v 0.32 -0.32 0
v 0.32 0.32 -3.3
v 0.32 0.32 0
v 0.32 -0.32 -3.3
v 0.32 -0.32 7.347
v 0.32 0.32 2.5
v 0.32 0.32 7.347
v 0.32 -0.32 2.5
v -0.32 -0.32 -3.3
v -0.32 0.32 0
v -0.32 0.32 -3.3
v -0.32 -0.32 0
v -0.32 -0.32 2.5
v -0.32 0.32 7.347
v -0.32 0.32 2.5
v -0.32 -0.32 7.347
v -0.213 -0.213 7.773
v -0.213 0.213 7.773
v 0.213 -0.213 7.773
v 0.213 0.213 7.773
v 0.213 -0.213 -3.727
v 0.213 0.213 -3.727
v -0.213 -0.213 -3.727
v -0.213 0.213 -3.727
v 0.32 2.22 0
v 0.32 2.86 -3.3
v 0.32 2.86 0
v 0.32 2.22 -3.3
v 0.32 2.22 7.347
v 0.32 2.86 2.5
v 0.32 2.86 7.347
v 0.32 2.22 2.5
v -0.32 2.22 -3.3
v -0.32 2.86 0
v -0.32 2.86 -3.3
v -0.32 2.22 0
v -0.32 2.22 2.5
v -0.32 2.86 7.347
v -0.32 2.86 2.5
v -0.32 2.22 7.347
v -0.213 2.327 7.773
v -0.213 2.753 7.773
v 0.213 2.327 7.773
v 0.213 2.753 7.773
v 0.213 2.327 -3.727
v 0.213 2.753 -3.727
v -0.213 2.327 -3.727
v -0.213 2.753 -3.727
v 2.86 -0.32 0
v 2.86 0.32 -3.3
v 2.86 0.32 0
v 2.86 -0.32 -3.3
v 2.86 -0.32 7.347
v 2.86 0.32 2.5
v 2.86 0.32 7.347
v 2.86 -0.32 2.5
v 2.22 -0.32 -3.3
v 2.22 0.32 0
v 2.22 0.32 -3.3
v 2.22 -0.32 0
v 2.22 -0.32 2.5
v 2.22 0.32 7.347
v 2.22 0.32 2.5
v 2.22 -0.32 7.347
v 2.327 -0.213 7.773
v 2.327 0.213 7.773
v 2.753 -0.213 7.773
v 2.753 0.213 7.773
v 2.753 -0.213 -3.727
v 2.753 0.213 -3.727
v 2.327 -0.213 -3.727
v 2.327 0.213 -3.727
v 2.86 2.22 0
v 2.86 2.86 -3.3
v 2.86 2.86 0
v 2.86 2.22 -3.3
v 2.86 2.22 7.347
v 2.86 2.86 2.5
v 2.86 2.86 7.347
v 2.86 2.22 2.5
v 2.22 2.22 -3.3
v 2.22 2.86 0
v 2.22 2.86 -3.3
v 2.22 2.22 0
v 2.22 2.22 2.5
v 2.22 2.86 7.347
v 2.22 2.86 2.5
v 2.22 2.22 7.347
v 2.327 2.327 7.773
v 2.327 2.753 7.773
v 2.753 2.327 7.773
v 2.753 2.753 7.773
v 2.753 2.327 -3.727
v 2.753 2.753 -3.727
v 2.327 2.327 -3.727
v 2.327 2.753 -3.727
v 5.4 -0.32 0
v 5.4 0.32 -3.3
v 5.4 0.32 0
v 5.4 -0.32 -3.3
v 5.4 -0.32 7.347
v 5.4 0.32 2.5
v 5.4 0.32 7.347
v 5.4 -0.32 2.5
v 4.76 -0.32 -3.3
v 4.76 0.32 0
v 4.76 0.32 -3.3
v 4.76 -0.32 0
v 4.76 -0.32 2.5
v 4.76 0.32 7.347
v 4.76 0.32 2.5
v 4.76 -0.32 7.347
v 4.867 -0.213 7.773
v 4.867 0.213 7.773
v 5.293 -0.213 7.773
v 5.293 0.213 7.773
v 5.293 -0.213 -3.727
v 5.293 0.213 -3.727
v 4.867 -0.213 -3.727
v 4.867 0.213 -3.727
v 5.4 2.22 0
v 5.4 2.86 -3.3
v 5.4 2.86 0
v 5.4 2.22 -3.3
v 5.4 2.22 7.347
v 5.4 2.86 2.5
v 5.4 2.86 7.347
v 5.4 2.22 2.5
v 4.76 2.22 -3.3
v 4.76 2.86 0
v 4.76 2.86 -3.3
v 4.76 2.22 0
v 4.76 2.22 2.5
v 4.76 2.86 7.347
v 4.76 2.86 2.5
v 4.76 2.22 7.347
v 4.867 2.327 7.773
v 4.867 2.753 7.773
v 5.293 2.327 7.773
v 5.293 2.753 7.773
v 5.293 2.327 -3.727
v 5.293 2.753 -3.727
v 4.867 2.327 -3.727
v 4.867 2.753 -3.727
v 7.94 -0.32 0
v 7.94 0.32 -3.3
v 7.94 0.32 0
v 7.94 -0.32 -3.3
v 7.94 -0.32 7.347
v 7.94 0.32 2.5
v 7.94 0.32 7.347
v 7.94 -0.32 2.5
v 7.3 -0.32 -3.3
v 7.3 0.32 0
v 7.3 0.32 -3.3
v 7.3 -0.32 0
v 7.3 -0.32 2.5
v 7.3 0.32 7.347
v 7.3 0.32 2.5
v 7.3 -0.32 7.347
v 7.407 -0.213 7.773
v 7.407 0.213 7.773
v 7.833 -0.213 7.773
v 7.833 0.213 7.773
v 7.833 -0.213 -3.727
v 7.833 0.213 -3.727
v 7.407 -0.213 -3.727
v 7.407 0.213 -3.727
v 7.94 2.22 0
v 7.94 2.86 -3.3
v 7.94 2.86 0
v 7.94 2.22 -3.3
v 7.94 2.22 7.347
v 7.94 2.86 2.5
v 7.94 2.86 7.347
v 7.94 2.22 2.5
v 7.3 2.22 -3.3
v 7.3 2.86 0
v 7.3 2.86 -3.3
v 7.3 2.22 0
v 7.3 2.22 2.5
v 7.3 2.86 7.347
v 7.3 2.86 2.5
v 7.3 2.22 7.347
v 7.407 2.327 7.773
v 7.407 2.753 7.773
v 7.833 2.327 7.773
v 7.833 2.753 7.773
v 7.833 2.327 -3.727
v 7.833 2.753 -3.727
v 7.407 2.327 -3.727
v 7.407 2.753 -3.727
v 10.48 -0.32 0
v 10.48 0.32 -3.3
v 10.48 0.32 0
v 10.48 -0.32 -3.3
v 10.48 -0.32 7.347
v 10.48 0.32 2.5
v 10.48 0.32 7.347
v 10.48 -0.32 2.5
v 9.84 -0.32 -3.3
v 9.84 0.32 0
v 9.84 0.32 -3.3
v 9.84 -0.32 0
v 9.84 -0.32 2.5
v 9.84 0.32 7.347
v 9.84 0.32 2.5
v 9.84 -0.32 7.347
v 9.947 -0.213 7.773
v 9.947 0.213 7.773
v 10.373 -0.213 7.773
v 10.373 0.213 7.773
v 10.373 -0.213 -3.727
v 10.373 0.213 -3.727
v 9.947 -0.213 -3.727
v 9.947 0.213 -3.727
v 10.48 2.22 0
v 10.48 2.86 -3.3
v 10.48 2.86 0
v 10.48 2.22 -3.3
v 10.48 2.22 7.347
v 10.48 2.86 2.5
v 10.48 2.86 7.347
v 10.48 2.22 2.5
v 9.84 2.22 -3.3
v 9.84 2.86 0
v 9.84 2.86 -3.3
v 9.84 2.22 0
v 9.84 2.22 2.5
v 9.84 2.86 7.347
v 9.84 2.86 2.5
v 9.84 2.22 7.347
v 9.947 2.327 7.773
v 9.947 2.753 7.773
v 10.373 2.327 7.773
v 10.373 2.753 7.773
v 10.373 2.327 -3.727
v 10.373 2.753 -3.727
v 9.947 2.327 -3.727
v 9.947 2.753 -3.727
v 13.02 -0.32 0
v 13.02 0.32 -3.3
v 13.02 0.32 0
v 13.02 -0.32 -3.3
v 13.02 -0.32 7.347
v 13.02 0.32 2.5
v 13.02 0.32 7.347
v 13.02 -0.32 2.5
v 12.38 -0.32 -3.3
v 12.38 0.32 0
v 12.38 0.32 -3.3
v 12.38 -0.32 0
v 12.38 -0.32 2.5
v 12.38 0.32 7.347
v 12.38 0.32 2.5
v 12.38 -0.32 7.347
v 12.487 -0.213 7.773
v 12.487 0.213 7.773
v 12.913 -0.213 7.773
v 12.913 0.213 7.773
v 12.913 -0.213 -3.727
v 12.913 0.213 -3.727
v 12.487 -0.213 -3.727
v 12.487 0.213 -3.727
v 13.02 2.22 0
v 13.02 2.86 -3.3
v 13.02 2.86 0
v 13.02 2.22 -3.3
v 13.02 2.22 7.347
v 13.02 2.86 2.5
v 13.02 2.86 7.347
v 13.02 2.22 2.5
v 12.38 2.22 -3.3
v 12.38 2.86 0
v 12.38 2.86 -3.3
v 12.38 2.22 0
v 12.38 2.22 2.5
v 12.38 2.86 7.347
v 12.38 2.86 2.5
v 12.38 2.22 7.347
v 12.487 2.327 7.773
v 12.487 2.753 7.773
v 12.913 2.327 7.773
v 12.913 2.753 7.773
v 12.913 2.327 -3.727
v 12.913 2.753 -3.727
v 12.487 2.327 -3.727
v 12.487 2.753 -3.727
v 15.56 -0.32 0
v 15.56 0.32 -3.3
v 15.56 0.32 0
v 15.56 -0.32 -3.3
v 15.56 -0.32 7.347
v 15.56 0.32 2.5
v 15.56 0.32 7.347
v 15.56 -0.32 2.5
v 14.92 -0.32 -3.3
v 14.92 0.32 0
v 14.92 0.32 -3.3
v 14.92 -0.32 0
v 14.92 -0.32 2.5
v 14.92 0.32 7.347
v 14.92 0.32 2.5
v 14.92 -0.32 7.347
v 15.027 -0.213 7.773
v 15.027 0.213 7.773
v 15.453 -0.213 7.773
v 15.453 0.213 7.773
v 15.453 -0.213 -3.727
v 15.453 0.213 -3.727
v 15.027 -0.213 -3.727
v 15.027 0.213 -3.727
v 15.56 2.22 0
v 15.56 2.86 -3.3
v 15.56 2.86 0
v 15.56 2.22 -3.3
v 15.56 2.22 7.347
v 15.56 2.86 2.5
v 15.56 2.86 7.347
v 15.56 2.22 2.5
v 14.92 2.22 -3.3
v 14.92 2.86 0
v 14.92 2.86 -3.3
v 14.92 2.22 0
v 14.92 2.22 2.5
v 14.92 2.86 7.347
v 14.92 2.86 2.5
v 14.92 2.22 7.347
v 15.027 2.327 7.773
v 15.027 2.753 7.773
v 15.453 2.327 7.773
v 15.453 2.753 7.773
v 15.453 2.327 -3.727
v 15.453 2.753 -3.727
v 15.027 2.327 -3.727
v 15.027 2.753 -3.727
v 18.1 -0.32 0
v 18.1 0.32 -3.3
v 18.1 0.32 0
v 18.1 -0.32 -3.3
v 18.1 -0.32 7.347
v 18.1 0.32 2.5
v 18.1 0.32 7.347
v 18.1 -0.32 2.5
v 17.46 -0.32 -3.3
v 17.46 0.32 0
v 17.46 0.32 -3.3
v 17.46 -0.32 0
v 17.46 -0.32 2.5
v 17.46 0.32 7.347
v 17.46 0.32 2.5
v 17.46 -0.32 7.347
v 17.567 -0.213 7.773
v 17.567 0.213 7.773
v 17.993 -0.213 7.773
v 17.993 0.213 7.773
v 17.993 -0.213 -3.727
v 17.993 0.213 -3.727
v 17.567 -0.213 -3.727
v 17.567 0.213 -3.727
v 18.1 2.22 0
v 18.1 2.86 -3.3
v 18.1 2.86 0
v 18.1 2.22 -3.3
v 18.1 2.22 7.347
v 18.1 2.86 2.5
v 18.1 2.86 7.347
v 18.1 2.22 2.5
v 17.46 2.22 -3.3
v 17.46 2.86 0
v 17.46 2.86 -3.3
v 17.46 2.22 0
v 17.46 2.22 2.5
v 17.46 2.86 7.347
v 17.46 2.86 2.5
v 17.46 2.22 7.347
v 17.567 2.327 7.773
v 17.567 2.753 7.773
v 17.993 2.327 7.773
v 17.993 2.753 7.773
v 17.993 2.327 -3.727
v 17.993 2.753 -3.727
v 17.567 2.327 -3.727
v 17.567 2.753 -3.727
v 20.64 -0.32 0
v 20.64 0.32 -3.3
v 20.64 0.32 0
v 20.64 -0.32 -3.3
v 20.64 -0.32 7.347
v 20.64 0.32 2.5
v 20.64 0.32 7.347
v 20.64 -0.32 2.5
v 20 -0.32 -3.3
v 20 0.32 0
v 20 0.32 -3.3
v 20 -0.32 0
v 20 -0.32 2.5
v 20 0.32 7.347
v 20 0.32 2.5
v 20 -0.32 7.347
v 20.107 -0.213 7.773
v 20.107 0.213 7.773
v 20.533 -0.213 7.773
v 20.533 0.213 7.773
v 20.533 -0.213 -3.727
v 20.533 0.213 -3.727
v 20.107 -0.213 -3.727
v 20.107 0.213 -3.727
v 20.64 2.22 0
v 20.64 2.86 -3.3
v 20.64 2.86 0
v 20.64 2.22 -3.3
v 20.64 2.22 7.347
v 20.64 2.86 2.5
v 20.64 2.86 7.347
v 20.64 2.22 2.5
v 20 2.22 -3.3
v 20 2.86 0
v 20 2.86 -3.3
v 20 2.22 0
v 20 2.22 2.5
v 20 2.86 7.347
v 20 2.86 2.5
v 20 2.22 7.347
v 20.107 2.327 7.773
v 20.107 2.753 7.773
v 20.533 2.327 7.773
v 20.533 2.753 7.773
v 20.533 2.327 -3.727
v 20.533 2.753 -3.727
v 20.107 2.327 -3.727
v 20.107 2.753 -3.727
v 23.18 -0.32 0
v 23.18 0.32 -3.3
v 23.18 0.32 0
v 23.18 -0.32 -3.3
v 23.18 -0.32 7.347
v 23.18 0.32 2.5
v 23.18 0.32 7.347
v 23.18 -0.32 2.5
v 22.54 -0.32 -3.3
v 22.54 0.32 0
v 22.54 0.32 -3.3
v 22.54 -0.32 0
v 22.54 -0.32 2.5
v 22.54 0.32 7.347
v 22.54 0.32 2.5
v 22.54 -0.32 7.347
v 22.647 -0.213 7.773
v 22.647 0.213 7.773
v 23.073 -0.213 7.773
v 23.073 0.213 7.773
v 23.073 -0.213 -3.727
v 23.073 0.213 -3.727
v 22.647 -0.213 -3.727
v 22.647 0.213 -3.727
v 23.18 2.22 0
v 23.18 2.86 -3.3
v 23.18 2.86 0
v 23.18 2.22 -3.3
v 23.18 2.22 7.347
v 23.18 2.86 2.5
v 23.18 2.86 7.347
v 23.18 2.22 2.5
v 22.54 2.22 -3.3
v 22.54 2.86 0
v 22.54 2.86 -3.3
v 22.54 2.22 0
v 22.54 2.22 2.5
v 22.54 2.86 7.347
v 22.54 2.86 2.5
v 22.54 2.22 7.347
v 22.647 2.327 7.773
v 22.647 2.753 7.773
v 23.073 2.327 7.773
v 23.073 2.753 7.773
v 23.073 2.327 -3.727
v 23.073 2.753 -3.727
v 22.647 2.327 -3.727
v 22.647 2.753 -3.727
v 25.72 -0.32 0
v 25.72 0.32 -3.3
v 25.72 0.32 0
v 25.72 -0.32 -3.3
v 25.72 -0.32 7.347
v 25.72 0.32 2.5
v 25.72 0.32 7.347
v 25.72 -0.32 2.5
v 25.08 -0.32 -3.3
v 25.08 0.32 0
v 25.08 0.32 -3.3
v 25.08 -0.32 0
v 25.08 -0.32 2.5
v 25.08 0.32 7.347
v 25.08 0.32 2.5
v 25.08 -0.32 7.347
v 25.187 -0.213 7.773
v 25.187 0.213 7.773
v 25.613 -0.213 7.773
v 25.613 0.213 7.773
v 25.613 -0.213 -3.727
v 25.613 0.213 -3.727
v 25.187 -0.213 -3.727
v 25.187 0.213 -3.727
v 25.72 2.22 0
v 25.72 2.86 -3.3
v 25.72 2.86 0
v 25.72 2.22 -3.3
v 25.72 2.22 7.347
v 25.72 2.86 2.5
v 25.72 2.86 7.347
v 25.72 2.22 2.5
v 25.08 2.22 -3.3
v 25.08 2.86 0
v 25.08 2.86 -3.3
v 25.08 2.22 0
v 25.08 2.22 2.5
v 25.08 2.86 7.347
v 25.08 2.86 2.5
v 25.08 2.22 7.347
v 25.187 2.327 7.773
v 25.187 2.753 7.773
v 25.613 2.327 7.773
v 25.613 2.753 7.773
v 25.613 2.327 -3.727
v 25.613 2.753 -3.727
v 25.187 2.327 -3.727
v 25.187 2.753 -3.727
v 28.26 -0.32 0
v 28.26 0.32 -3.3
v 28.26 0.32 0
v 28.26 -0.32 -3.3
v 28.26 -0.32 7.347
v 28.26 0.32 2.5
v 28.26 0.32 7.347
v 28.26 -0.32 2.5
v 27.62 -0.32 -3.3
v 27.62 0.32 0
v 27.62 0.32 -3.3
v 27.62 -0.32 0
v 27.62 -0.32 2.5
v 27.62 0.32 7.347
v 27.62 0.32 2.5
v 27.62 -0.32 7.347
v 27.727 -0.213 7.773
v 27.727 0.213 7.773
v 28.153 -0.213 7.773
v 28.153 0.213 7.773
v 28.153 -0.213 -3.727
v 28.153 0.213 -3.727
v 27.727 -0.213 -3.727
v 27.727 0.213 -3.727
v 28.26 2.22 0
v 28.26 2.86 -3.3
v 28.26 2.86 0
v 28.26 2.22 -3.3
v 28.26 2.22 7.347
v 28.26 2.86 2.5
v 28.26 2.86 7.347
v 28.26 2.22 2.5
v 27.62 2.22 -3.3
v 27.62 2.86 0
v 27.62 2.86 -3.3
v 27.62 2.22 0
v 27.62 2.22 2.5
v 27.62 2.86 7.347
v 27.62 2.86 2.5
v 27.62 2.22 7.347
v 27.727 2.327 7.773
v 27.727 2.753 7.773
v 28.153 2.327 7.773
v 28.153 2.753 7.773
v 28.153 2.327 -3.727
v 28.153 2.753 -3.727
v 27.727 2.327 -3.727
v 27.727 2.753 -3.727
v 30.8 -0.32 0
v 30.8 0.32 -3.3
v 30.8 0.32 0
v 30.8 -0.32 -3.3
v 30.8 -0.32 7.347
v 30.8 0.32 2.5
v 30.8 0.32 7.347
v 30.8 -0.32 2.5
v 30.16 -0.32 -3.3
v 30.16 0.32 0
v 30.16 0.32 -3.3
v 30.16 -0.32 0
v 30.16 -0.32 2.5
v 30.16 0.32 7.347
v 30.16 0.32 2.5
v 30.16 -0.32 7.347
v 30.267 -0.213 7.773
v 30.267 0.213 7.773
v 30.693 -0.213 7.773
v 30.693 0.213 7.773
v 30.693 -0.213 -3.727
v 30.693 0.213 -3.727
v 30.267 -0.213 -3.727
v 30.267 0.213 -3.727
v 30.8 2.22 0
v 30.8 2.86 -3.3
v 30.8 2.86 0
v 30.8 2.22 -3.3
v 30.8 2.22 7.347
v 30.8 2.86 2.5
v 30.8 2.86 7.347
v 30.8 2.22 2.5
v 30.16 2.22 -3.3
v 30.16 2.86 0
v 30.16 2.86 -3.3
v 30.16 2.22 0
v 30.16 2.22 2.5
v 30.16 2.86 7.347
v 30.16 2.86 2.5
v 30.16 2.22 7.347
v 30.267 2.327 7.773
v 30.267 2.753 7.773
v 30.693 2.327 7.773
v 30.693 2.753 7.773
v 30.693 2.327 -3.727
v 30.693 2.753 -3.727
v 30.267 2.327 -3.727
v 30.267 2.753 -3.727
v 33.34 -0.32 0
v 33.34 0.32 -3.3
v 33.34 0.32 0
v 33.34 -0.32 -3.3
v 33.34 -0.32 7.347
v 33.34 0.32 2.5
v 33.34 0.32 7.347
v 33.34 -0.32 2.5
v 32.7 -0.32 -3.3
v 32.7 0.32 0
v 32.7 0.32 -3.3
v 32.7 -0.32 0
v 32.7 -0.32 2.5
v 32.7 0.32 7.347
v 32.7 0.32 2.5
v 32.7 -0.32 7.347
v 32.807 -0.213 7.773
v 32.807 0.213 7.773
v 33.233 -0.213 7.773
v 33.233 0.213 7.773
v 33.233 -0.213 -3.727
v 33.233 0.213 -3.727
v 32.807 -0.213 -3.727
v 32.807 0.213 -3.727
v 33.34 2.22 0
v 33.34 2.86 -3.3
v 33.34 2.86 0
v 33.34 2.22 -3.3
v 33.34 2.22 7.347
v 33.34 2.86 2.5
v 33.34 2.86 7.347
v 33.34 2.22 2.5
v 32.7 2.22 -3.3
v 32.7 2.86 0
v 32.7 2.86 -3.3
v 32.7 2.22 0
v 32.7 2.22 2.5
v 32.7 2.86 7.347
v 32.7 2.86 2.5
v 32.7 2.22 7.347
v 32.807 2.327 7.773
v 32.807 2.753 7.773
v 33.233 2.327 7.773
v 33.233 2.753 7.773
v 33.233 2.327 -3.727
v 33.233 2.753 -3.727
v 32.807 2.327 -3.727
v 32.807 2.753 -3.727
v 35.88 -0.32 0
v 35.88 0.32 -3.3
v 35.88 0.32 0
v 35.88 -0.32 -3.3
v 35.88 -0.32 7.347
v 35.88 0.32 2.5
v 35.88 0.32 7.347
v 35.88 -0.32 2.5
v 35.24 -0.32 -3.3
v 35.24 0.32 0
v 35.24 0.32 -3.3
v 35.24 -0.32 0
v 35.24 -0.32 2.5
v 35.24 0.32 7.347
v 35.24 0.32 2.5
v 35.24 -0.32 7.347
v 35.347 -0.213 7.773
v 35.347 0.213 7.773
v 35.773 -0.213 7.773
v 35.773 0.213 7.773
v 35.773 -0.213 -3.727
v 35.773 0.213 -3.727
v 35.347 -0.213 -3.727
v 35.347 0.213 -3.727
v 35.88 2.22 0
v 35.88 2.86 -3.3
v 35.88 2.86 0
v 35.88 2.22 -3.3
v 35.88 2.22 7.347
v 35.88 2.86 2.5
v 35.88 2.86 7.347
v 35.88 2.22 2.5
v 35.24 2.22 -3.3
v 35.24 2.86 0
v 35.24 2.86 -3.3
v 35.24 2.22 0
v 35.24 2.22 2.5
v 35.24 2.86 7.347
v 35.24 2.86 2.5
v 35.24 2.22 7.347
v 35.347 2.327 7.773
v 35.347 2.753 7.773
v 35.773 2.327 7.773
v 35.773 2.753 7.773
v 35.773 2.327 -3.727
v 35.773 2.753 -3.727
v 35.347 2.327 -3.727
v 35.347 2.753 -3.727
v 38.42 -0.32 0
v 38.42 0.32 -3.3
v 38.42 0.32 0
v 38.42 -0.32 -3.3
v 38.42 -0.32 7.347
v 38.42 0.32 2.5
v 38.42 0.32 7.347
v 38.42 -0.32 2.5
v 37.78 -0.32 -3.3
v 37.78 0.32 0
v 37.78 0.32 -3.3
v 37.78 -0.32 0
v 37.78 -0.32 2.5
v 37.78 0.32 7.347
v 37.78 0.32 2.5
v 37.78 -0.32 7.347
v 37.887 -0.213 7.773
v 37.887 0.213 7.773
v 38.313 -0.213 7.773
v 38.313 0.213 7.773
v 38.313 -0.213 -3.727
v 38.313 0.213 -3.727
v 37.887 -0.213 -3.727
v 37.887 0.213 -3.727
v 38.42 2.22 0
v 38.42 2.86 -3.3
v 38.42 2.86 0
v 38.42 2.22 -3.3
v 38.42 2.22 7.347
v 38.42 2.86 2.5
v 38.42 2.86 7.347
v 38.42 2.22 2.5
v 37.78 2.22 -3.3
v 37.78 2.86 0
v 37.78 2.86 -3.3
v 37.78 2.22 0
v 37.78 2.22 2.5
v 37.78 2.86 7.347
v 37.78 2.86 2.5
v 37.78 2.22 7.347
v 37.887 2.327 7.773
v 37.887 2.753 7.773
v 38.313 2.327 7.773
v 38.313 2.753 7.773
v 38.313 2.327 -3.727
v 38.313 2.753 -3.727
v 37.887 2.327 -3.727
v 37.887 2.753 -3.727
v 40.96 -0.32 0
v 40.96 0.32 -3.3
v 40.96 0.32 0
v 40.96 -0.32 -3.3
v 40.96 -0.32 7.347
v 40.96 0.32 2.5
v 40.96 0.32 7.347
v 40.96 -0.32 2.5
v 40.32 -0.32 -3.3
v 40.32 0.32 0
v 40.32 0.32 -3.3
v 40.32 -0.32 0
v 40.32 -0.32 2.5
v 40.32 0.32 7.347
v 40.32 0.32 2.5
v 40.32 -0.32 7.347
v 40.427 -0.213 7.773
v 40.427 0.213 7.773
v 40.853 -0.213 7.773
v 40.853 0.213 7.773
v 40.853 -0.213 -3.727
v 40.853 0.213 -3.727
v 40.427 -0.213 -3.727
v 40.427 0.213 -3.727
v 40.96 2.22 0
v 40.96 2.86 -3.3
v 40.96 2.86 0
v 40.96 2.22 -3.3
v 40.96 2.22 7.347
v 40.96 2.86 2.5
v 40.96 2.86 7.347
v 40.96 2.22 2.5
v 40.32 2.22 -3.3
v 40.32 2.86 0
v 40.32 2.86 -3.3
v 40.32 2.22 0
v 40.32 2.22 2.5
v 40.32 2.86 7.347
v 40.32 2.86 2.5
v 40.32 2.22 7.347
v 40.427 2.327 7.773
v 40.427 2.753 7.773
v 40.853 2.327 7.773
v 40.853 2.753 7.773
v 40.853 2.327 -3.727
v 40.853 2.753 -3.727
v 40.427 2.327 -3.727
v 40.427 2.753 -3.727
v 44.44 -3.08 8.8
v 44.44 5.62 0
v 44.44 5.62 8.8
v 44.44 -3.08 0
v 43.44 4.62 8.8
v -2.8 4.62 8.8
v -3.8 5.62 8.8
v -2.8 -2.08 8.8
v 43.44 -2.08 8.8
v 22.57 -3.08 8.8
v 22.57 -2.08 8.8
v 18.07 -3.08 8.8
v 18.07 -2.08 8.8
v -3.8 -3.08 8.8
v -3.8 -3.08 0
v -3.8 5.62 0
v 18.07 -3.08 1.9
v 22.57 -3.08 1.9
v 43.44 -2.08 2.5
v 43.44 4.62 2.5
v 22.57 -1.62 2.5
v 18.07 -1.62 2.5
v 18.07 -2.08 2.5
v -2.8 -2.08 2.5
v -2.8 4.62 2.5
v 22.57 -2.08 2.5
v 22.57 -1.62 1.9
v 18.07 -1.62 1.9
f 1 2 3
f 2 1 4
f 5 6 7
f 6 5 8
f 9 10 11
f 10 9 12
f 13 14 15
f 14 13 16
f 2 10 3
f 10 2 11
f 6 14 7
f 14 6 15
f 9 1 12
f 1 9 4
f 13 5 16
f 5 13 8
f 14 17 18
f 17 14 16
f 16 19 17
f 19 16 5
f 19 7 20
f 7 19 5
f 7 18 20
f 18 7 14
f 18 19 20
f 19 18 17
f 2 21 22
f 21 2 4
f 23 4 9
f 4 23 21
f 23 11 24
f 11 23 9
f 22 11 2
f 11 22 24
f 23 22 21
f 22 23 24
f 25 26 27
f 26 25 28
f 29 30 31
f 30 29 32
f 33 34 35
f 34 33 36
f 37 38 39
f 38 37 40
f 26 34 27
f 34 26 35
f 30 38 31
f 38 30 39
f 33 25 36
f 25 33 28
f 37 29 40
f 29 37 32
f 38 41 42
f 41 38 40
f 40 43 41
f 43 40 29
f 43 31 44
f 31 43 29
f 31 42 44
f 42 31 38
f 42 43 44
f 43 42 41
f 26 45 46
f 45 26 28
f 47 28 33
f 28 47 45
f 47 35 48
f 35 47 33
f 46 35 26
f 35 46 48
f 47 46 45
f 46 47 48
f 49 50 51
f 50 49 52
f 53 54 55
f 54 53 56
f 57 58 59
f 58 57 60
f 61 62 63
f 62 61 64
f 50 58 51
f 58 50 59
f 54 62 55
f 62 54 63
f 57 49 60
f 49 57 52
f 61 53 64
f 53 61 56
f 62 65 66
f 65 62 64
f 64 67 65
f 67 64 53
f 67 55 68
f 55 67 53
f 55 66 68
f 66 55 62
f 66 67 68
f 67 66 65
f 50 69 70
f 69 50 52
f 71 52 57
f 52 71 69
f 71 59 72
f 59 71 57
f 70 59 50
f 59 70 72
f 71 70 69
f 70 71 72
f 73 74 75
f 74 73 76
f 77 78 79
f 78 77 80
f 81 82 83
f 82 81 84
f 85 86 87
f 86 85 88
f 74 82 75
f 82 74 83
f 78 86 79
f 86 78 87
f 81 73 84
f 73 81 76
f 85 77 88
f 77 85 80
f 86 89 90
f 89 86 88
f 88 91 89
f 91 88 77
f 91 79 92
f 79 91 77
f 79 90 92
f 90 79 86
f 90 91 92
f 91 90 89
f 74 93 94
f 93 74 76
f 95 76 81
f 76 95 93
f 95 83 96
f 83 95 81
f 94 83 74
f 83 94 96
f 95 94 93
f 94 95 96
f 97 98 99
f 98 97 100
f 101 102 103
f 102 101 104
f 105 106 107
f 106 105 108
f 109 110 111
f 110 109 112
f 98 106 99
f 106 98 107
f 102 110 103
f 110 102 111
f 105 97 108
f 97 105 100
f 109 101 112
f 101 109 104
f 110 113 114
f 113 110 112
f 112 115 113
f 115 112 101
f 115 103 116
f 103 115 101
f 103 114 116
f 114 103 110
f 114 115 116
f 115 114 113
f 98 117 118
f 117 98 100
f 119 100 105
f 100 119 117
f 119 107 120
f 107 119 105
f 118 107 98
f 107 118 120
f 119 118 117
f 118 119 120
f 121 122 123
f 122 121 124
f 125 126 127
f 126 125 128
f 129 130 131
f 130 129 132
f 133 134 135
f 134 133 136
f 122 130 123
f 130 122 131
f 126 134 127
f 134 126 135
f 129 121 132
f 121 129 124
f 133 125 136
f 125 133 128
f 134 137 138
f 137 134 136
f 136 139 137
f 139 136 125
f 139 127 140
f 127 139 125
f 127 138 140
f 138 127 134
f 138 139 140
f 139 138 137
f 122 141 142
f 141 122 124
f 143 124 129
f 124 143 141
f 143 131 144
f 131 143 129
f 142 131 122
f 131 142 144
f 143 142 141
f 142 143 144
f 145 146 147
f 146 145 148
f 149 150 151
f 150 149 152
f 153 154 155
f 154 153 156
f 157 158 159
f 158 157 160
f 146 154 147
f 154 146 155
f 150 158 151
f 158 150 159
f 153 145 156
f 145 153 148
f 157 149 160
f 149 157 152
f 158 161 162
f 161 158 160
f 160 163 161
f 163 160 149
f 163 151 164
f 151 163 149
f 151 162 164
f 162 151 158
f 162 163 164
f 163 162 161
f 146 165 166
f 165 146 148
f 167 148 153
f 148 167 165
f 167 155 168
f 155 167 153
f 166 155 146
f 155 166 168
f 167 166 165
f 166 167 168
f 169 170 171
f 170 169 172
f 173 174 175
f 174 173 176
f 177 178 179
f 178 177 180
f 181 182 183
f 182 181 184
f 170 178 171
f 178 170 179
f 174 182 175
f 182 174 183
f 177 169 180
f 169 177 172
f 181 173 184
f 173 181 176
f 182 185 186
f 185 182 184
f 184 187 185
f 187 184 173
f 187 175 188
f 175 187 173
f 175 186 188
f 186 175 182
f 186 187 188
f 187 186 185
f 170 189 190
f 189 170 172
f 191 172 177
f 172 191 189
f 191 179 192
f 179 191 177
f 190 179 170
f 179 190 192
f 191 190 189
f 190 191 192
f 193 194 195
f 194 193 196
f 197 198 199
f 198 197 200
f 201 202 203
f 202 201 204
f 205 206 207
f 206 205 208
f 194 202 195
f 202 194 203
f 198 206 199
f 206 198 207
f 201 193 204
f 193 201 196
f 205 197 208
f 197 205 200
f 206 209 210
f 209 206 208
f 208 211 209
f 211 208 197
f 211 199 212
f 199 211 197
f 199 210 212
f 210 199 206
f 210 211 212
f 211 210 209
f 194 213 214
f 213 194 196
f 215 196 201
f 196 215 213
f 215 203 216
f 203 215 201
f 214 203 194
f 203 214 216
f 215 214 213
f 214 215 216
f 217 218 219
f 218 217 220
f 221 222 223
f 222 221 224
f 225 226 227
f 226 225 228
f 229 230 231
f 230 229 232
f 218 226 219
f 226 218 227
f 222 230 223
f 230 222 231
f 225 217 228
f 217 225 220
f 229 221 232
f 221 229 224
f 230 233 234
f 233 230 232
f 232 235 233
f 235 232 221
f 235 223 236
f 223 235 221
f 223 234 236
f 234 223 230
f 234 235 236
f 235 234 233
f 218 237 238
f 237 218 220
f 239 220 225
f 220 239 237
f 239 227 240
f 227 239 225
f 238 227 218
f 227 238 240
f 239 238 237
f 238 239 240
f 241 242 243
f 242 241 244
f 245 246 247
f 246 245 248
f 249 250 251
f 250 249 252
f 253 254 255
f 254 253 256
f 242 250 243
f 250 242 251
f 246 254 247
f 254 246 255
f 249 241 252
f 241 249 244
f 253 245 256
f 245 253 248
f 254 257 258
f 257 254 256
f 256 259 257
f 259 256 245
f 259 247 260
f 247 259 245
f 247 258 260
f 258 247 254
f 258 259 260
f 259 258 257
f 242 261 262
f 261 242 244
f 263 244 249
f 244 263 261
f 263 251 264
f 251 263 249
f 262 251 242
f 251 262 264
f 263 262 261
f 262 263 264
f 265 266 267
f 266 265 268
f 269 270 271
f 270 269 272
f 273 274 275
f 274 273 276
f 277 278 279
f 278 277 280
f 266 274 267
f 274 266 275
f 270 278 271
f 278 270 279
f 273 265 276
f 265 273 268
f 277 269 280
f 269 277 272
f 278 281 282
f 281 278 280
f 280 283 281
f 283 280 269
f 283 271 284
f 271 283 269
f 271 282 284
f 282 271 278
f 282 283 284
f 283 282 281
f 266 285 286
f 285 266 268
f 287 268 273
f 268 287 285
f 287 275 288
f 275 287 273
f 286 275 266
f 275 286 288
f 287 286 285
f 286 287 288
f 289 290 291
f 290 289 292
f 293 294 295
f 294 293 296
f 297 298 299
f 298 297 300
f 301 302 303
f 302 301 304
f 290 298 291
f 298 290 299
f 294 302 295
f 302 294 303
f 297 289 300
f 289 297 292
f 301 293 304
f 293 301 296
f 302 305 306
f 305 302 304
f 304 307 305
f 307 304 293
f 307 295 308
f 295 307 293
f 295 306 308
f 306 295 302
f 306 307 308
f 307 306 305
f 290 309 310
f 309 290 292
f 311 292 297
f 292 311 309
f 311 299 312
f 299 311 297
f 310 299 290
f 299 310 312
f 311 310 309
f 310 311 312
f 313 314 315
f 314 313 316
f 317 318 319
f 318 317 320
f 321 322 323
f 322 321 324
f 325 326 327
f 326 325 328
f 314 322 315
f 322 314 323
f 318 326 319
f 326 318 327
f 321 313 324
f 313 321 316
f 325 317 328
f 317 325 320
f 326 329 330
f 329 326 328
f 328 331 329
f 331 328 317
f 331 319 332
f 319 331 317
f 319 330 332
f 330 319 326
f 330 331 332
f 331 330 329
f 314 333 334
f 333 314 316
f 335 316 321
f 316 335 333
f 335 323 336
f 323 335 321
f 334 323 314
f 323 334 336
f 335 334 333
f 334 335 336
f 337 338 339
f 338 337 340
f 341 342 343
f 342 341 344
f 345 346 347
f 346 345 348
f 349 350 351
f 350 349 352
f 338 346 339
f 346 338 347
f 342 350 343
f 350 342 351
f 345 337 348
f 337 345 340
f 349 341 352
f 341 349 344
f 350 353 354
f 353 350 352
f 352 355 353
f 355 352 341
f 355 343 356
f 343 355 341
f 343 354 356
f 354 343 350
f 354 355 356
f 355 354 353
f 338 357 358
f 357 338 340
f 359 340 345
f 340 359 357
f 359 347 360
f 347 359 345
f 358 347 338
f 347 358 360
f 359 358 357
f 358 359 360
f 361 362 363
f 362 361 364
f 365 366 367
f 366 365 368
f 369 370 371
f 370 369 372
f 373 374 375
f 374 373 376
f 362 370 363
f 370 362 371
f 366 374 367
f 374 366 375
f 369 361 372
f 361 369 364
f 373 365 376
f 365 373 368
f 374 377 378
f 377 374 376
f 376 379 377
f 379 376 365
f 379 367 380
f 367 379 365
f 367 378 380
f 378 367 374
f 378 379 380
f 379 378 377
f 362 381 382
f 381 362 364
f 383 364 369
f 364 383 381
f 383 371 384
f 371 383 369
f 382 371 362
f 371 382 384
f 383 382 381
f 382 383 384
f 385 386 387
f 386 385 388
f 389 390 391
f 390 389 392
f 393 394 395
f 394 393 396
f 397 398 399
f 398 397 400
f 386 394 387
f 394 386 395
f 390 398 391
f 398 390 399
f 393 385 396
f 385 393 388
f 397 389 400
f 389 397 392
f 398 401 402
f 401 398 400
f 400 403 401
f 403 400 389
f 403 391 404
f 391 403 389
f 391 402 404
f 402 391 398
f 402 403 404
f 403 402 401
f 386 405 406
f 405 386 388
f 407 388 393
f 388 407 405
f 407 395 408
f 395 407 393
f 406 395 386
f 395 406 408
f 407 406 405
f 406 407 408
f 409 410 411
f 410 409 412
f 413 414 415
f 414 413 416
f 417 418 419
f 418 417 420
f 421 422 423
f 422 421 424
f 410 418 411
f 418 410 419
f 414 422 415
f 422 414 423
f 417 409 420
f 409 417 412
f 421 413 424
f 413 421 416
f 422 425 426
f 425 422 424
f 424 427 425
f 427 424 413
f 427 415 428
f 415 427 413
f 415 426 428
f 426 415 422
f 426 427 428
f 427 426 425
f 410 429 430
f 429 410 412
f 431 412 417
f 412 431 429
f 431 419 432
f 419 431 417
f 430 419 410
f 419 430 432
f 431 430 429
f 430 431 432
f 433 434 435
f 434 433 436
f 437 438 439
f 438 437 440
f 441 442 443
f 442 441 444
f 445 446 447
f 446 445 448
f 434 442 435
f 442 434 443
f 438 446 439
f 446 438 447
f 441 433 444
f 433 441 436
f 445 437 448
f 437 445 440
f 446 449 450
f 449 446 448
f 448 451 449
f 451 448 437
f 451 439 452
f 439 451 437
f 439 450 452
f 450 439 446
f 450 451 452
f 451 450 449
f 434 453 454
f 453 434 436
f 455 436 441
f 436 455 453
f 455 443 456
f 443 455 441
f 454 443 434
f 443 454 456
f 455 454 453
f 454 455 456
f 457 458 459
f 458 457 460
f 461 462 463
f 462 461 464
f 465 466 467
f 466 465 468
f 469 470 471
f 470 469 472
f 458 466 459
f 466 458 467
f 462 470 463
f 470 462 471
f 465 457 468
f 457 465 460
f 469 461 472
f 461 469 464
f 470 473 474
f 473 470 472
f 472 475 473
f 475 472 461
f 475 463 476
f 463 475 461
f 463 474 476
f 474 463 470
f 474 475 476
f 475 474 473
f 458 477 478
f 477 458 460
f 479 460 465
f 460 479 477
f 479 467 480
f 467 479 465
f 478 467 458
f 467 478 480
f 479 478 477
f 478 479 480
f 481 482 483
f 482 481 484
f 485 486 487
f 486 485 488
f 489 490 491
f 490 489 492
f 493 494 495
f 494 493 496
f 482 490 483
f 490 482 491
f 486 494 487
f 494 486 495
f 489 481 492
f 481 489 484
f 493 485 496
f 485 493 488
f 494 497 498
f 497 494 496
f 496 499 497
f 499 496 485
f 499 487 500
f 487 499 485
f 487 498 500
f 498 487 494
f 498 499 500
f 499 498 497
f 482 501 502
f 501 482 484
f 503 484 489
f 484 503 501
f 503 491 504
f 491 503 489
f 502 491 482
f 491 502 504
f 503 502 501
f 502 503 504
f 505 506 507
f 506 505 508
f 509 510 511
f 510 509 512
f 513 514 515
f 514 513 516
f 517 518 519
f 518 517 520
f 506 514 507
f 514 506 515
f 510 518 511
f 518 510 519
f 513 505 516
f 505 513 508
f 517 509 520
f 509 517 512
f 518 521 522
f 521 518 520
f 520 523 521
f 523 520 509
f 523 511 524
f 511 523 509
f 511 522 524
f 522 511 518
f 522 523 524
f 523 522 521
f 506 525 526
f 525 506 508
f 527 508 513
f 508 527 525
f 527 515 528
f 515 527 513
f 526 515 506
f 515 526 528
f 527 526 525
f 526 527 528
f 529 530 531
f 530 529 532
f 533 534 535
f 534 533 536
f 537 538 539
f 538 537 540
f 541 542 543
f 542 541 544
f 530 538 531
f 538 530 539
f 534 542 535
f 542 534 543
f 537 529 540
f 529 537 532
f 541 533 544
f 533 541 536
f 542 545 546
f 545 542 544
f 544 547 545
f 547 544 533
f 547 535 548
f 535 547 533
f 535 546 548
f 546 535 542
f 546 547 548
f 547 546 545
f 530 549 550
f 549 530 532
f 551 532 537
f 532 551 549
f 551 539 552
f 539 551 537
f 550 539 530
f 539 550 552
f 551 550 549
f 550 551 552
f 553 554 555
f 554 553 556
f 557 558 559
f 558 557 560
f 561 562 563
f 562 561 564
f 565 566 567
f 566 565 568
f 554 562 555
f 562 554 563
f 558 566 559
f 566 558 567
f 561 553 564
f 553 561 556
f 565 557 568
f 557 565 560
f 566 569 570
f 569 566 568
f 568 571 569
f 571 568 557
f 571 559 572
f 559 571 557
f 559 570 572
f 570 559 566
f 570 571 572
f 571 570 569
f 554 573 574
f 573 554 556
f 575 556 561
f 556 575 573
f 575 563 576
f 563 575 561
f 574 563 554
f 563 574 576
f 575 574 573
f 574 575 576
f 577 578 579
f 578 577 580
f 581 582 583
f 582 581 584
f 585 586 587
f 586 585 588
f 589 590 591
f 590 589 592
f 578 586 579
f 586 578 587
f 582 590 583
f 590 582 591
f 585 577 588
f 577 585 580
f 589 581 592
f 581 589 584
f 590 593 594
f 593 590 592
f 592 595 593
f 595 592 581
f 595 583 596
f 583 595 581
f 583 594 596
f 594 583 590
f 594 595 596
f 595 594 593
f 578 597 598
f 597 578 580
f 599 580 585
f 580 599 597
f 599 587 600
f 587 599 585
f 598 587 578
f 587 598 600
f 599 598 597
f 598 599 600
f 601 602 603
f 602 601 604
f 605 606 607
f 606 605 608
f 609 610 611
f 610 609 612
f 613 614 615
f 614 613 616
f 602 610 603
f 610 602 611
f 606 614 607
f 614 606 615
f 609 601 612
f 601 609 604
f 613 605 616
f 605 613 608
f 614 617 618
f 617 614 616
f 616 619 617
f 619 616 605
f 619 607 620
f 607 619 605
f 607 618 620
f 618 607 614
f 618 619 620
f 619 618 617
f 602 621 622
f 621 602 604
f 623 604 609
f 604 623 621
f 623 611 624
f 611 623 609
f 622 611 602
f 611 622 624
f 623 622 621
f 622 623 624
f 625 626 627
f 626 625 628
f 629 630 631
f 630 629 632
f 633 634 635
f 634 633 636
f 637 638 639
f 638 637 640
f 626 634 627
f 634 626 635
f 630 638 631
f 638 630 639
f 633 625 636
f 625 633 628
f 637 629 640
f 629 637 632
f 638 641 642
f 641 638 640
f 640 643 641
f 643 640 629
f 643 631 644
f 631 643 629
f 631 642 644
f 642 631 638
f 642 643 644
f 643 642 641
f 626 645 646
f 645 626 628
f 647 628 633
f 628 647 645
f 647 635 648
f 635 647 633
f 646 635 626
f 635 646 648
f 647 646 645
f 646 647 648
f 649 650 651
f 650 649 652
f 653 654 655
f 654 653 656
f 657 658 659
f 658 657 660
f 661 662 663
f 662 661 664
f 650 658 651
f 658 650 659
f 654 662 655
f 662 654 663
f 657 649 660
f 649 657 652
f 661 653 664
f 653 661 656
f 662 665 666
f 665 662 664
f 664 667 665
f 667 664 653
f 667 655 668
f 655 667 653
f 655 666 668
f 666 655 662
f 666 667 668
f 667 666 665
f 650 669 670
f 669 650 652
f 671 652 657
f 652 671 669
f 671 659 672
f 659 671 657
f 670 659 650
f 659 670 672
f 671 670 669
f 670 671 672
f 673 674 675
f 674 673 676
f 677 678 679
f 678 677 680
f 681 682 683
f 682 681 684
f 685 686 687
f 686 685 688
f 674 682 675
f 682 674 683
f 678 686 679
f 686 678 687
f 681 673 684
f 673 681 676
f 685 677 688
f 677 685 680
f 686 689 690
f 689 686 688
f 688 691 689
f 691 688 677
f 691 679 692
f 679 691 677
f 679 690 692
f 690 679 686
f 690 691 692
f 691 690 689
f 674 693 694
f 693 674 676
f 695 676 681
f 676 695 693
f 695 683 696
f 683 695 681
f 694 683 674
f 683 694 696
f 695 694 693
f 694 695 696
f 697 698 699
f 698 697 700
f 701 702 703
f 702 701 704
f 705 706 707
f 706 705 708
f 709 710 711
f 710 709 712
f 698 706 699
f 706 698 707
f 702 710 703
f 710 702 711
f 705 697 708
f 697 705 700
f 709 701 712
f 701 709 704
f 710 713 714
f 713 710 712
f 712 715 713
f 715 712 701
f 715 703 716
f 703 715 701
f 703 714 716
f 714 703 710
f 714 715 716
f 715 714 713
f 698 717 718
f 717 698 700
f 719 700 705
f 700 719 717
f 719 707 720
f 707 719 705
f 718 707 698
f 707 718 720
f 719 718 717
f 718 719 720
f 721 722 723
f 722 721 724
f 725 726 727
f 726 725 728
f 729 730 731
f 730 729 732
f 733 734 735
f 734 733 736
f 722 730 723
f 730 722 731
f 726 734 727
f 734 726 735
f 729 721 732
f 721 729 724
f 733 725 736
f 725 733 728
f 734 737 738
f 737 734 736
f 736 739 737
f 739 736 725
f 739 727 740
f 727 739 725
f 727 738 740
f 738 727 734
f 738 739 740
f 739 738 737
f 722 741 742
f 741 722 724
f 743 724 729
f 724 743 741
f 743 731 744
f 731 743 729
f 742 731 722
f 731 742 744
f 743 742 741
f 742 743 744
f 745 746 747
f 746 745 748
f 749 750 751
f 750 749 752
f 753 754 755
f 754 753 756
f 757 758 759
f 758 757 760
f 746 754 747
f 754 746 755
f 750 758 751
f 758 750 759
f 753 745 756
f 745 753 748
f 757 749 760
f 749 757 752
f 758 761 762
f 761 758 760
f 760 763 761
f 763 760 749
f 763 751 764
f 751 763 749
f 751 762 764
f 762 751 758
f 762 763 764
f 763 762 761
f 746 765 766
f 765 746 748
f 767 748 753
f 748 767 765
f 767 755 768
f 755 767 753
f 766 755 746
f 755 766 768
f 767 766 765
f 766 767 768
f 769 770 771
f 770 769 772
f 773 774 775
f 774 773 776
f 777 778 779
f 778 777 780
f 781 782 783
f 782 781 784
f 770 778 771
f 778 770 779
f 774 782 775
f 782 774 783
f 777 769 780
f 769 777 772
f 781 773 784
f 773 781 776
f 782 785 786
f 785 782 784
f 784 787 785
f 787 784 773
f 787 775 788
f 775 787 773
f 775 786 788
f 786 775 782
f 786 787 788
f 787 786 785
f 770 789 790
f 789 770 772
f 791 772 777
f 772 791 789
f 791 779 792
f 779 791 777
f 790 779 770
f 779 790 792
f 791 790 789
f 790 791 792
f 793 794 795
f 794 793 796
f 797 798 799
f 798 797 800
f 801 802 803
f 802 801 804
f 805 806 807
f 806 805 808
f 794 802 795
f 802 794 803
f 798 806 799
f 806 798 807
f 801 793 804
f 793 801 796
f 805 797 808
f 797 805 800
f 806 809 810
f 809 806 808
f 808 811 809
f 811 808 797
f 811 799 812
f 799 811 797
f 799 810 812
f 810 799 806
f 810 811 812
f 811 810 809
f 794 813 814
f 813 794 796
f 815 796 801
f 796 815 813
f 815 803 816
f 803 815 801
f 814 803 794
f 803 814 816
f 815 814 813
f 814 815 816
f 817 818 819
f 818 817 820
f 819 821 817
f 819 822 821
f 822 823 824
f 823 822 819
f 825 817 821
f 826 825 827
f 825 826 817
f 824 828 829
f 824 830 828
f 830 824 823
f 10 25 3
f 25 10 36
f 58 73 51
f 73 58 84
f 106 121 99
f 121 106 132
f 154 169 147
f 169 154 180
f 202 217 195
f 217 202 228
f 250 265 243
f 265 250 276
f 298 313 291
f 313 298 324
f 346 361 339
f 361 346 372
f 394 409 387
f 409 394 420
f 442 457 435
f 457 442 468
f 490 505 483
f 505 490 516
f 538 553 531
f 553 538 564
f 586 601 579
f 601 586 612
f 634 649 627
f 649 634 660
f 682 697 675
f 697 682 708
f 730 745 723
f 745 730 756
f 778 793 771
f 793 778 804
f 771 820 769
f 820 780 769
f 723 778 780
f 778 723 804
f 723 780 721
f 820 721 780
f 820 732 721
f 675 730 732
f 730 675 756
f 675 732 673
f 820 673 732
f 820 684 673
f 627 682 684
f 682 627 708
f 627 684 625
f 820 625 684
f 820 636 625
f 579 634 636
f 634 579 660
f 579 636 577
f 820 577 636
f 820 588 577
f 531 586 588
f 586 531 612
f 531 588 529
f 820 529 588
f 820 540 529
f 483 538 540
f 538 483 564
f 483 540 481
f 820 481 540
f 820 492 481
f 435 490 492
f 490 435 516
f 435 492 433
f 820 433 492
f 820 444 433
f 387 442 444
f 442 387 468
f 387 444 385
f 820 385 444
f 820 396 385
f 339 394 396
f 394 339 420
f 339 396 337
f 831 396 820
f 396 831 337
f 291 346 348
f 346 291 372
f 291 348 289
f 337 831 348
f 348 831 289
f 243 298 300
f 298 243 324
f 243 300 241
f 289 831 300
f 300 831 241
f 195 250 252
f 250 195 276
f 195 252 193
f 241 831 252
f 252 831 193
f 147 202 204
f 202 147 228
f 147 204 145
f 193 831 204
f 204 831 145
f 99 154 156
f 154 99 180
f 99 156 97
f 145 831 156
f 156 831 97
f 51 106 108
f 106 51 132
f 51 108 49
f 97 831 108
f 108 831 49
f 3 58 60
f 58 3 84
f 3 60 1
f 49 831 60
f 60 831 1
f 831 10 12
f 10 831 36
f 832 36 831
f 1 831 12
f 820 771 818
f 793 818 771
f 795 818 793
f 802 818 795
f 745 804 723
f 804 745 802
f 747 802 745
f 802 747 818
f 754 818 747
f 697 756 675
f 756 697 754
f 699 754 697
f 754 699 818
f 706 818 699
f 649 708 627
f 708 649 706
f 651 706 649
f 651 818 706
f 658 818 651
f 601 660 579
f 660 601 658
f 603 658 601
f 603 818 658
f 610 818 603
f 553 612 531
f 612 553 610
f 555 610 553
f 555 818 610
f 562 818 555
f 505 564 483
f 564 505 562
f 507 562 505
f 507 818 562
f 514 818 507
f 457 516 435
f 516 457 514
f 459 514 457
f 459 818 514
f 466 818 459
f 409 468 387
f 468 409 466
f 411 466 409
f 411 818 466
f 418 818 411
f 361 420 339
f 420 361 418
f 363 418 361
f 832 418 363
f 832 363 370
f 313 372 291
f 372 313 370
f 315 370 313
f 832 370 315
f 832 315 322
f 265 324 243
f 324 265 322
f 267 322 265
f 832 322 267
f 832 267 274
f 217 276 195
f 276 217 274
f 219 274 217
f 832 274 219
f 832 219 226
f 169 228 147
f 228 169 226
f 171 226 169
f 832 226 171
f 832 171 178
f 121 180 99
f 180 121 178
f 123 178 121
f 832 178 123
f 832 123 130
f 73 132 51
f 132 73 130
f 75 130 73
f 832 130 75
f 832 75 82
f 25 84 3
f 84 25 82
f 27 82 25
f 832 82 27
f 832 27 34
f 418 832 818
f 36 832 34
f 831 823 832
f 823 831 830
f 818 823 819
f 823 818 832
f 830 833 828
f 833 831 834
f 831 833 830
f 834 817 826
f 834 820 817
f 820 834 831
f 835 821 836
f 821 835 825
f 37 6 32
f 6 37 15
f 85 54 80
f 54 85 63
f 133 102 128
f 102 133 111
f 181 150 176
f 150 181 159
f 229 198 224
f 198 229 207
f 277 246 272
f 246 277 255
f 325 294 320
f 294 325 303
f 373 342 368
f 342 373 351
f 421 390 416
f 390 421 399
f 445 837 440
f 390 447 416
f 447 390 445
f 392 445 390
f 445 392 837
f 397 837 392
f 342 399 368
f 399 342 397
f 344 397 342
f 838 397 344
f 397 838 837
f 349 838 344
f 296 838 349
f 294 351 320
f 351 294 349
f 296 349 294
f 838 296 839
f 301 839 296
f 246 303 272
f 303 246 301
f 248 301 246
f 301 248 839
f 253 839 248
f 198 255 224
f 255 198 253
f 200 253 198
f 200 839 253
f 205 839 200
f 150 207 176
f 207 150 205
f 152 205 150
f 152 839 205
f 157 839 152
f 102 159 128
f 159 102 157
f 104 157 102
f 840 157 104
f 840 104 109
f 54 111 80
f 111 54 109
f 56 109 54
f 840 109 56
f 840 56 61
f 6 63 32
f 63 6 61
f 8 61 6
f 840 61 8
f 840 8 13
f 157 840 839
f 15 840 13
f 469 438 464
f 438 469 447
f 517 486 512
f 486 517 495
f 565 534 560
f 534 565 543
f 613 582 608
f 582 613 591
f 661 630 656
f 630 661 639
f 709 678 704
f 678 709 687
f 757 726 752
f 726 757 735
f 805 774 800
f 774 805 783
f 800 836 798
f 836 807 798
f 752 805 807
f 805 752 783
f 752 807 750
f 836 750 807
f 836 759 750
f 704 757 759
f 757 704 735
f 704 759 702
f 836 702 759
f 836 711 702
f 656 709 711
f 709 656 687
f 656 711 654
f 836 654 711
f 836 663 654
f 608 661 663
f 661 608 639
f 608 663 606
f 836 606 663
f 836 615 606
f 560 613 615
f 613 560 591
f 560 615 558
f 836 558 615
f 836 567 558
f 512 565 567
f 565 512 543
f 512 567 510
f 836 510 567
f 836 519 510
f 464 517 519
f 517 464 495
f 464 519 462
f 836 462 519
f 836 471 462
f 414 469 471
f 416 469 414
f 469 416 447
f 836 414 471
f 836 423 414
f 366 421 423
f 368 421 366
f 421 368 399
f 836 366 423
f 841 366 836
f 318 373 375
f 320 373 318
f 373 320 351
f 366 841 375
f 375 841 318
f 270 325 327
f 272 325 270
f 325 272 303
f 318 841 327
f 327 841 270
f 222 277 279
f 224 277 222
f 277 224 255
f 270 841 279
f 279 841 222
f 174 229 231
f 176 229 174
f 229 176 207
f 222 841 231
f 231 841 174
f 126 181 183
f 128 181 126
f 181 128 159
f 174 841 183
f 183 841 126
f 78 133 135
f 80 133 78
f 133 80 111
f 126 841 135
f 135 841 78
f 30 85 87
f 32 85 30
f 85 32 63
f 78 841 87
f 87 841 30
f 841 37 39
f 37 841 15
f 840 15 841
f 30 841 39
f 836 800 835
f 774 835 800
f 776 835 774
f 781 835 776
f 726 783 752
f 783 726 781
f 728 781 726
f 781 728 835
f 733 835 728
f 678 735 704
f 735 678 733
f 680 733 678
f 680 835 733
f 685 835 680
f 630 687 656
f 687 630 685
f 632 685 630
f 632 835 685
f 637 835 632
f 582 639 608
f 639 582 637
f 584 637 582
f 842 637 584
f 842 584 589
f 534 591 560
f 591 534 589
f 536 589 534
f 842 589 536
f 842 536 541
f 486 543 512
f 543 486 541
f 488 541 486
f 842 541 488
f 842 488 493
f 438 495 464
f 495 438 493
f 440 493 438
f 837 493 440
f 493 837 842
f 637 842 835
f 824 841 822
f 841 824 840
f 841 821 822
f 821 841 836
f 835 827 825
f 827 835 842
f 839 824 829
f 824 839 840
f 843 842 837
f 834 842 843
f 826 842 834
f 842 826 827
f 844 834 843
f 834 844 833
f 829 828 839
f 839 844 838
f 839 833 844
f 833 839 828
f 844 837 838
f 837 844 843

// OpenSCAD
// JILN 321034SG0ABK00A01 pin header model

$horizPinCount = 17;


// dimensions are in mm
$pinLength = 11.5;
$pinTubProtrusion = 5.7;
$pinBottomProtrusion = 3.3;
$pinBodySide = 0.64;
$pinTipSide = $pinBodySide * 2 / 3;

$pinSpacing = 2.54;
$tubSideSpacing = 3.8;
$tubFrontRearSpacing = 3.08;
$tubOuterHeight = 8.8;
$tubLipThickness = (8.7 - 6.7)/2;

$keyholeWidth = 4.5;
$keyholeHeight = 6.9;


// calculated dimensions
$tubInnerHeight = $tubOuterHeight - ($pinLength - ($pinTubProtrusion + $pinBottomProtrusion));
$tubOuterLength = $pinSpacing * ($horizPinCount-1) + 2 * $tubSideSpacing;
$allPinsWidth = ($horizPinCount-1) * $pinSpacing;


module cutPyramid($baseSide, $topSide, $height) {
    $sideOffset = ($baseSide - $topSide)/2;
    polyhedron
        ( points =
            [ [0, 0, 0]
            , [$baseSide, 0, 0]
            , [$baseSide, $baseSide, 0]
            , [0, $baseSide, 0]
            , [$sideOffset, $sideOffset, $height]
            , [$sideOffset+$topSide, $sideOffset, $height]
            , [$sideOffset+$topSide, $sideOffset+$topSide, $height]
            , [$sideOffset, $sideOffset+$topSide, $height]
            ]
        , faces =
            [ [0, 3, 2, 1]
            , [0, 4, 7, 3]
            , [0, 1, 5, 4]
            , [2, 6, 5, 1]
            , [3, 7, 6, 2]
            , [4, 5, 6, 7]
            ]
    );
};

module pin() {
    $pinTipOffset = ($pinBodySide - $pinTipSide) / 2;

    translate([-$pinBodySide/2, -$pinBodySide/2, -$pinBottomProtrusion])
        union() {
            // body
            cube([$pinBodySide, $pinBodySide, $pinLength - 2*$pinTipSide]);

            // tip
            translate([0, 0, $pinLength - 2*$pinTipSide])
                cutPyramid($pinBodySide, $pinTipSide, $pinTipSide);

            // base
            translate([$pinBodySide, 0, 0])
            rotate([0, 180, 0])
                cutPyramid($pinBodySide, $pinTipSide, $pinTipSide);
        }
};

// place pins
for (i = [0:$horizPinCount-1]) {
    translate([i * $pinSpacing, 0, 0])
        pin();
    translate([i * $pinSpacing, $pinSpacing, 0])
        pin();
}

difference() {
    // tub
    translate([-$tubSideSpacing, -$tubFrontRearSpacing, 0])
    difference() {
        cube(
            [ $tubOuterLength
            , $pinSpacing + 2 * $tubFrontRearSpacing
            , $tubOuterHeight
            ]);

        translate([$tubLipThickness, $tubLipThickness, $tubOuterHeight - $tubInnerHeight])
        cube(
            [ $tubOuterLength - 2 * $tubLipThickness
            , $pinSpacing + 2 * $tubFrontRearSpacing - 2 * $tubLipThickness
            , $tubInnerHeight + 1
            ]);
    }
    
    // keyhole
    translate([($allPinsWidth-$keyholeWidth)/2, -($pinSpacing+$tubFrontRearSpacing), $tubOuterHeight - $keyholeHeight])
    cube(
        [ $keyholeWidth
        , 4
        , $keyholeHeight + 1
        ]);
}
//
